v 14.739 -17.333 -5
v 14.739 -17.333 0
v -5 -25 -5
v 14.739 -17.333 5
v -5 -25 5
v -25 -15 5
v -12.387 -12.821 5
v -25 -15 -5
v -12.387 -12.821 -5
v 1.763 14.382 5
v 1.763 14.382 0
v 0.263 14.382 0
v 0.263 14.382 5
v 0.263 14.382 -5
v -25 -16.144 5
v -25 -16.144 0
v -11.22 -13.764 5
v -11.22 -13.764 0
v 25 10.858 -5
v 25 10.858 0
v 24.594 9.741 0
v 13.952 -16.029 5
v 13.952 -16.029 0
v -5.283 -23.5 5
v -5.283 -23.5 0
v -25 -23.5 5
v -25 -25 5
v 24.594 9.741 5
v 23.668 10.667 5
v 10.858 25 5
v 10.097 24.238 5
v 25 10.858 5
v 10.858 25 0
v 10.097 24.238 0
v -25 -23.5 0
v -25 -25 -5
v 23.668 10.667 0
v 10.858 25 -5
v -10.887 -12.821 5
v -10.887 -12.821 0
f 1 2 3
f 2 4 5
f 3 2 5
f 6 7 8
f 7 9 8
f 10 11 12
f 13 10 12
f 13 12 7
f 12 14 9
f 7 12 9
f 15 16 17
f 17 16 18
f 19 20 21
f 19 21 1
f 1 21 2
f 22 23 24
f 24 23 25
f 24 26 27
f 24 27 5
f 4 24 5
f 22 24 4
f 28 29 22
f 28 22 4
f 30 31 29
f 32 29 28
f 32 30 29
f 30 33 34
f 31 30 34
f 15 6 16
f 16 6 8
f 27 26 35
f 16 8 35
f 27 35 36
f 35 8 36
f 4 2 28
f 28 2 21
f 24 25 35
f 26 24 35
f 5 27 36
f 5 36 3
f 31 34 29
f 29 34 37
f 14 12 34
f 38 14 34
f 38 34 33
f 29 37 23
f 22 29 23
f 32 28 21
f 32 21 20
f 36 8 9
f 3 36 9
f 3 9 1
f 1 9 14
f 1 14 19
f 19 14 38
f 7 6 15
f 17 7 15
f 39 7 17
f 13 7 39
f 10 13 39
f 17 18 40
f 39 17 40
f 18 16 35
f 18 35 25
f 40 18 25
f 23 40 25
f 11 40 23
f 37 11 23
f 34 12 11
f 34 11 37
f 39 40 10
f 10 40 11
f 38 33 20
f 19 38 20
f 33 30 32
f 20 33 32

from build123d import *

# Parameters (mm, degrees)
F0_W     = 50
F0_H     = 50
F1_DEPTH = 5
F3_DEPTH = 10
F4_DEPTH = 5
F6_DEPTH = 5


with BuildPart() as f1:
    # F0 (on Top) → F1 (new body, symmetric)
    with BuildSketch(Plane.XY):
        Rectangle(F0_W, F0_H)
    extrude(amount=F1_DEPTH, both=True)

    # F2 (on face) → F3 (cut)
    with BuildSketch(Plane.XY.offset(5)):
        Polygon((0.262668, 14.382005), (10.857864, 25), (-25, 25), (-25, -15), (-12.386651, -12.820839), align=None)
        Polygon((25, -25), (25, 10.857864), (14.739396, -17.332914), (-5, -25), align=None)
        Polygon((25, 25), (10.857864, 25), (25, 10.857864), align=None)
    extrude(amount=-F3_DEPTH, mode=Mode.SUBTRACT)

    # F1_face (on face) → F4 (cut)
    with BuildSketch(Plane.XY.offset(5)):
        Polygon((-25, -15), (-25, -25), (-5, -25), (14.739396, -17.332914), (25, 10.857864), (10.857864, 25), (0.262668, 14.382005), (-12.386651, -12.820839), align=None)
    extrude(amount=-F4_DEPTH, mode=Mode.SUBTRACT)

    # F5 (on face) → F6 (join)
    with BuildSketch(Plane.XY):
        Polygon((-11.219984, -13.763648), (-10.886651, -12.820839), (-12.386651, -12.820839), align=None)
        Polygon((1.762668, 14.382005), (0.262668, 14.382005), (-12.386651, -12.820839), (-10.886651, -12.820839), align=None)
        Polygon((-11.219984, -13.763648), (-12.386651, -12.820839), (-25, -15), (-25, -16.14437), align=None)
        Polygon((-5, -25), (-5.283205, -23.5), (-25, -23.5), (-25, -25), align=None)
        Polygon((14.739396, -17.332914), (13.951547, -16.028926), (-5.283205, -23.5), (-5, -25), align=None)
        Polygon((24.593647, 9.741419), (23.668068, 10.666997), (13.951547, -16.028926), (14.739396, -17.332914), align=None)
        Polygon((10.857864, 25), (10.097283, 24.237782), (10.857864, 23.477201), (23.668068, 10.666997), (24.593647, 9.741419), (25, 10.857864), align=None)
    extrude(amount=F6_DEPTH)


solid = f1.part
